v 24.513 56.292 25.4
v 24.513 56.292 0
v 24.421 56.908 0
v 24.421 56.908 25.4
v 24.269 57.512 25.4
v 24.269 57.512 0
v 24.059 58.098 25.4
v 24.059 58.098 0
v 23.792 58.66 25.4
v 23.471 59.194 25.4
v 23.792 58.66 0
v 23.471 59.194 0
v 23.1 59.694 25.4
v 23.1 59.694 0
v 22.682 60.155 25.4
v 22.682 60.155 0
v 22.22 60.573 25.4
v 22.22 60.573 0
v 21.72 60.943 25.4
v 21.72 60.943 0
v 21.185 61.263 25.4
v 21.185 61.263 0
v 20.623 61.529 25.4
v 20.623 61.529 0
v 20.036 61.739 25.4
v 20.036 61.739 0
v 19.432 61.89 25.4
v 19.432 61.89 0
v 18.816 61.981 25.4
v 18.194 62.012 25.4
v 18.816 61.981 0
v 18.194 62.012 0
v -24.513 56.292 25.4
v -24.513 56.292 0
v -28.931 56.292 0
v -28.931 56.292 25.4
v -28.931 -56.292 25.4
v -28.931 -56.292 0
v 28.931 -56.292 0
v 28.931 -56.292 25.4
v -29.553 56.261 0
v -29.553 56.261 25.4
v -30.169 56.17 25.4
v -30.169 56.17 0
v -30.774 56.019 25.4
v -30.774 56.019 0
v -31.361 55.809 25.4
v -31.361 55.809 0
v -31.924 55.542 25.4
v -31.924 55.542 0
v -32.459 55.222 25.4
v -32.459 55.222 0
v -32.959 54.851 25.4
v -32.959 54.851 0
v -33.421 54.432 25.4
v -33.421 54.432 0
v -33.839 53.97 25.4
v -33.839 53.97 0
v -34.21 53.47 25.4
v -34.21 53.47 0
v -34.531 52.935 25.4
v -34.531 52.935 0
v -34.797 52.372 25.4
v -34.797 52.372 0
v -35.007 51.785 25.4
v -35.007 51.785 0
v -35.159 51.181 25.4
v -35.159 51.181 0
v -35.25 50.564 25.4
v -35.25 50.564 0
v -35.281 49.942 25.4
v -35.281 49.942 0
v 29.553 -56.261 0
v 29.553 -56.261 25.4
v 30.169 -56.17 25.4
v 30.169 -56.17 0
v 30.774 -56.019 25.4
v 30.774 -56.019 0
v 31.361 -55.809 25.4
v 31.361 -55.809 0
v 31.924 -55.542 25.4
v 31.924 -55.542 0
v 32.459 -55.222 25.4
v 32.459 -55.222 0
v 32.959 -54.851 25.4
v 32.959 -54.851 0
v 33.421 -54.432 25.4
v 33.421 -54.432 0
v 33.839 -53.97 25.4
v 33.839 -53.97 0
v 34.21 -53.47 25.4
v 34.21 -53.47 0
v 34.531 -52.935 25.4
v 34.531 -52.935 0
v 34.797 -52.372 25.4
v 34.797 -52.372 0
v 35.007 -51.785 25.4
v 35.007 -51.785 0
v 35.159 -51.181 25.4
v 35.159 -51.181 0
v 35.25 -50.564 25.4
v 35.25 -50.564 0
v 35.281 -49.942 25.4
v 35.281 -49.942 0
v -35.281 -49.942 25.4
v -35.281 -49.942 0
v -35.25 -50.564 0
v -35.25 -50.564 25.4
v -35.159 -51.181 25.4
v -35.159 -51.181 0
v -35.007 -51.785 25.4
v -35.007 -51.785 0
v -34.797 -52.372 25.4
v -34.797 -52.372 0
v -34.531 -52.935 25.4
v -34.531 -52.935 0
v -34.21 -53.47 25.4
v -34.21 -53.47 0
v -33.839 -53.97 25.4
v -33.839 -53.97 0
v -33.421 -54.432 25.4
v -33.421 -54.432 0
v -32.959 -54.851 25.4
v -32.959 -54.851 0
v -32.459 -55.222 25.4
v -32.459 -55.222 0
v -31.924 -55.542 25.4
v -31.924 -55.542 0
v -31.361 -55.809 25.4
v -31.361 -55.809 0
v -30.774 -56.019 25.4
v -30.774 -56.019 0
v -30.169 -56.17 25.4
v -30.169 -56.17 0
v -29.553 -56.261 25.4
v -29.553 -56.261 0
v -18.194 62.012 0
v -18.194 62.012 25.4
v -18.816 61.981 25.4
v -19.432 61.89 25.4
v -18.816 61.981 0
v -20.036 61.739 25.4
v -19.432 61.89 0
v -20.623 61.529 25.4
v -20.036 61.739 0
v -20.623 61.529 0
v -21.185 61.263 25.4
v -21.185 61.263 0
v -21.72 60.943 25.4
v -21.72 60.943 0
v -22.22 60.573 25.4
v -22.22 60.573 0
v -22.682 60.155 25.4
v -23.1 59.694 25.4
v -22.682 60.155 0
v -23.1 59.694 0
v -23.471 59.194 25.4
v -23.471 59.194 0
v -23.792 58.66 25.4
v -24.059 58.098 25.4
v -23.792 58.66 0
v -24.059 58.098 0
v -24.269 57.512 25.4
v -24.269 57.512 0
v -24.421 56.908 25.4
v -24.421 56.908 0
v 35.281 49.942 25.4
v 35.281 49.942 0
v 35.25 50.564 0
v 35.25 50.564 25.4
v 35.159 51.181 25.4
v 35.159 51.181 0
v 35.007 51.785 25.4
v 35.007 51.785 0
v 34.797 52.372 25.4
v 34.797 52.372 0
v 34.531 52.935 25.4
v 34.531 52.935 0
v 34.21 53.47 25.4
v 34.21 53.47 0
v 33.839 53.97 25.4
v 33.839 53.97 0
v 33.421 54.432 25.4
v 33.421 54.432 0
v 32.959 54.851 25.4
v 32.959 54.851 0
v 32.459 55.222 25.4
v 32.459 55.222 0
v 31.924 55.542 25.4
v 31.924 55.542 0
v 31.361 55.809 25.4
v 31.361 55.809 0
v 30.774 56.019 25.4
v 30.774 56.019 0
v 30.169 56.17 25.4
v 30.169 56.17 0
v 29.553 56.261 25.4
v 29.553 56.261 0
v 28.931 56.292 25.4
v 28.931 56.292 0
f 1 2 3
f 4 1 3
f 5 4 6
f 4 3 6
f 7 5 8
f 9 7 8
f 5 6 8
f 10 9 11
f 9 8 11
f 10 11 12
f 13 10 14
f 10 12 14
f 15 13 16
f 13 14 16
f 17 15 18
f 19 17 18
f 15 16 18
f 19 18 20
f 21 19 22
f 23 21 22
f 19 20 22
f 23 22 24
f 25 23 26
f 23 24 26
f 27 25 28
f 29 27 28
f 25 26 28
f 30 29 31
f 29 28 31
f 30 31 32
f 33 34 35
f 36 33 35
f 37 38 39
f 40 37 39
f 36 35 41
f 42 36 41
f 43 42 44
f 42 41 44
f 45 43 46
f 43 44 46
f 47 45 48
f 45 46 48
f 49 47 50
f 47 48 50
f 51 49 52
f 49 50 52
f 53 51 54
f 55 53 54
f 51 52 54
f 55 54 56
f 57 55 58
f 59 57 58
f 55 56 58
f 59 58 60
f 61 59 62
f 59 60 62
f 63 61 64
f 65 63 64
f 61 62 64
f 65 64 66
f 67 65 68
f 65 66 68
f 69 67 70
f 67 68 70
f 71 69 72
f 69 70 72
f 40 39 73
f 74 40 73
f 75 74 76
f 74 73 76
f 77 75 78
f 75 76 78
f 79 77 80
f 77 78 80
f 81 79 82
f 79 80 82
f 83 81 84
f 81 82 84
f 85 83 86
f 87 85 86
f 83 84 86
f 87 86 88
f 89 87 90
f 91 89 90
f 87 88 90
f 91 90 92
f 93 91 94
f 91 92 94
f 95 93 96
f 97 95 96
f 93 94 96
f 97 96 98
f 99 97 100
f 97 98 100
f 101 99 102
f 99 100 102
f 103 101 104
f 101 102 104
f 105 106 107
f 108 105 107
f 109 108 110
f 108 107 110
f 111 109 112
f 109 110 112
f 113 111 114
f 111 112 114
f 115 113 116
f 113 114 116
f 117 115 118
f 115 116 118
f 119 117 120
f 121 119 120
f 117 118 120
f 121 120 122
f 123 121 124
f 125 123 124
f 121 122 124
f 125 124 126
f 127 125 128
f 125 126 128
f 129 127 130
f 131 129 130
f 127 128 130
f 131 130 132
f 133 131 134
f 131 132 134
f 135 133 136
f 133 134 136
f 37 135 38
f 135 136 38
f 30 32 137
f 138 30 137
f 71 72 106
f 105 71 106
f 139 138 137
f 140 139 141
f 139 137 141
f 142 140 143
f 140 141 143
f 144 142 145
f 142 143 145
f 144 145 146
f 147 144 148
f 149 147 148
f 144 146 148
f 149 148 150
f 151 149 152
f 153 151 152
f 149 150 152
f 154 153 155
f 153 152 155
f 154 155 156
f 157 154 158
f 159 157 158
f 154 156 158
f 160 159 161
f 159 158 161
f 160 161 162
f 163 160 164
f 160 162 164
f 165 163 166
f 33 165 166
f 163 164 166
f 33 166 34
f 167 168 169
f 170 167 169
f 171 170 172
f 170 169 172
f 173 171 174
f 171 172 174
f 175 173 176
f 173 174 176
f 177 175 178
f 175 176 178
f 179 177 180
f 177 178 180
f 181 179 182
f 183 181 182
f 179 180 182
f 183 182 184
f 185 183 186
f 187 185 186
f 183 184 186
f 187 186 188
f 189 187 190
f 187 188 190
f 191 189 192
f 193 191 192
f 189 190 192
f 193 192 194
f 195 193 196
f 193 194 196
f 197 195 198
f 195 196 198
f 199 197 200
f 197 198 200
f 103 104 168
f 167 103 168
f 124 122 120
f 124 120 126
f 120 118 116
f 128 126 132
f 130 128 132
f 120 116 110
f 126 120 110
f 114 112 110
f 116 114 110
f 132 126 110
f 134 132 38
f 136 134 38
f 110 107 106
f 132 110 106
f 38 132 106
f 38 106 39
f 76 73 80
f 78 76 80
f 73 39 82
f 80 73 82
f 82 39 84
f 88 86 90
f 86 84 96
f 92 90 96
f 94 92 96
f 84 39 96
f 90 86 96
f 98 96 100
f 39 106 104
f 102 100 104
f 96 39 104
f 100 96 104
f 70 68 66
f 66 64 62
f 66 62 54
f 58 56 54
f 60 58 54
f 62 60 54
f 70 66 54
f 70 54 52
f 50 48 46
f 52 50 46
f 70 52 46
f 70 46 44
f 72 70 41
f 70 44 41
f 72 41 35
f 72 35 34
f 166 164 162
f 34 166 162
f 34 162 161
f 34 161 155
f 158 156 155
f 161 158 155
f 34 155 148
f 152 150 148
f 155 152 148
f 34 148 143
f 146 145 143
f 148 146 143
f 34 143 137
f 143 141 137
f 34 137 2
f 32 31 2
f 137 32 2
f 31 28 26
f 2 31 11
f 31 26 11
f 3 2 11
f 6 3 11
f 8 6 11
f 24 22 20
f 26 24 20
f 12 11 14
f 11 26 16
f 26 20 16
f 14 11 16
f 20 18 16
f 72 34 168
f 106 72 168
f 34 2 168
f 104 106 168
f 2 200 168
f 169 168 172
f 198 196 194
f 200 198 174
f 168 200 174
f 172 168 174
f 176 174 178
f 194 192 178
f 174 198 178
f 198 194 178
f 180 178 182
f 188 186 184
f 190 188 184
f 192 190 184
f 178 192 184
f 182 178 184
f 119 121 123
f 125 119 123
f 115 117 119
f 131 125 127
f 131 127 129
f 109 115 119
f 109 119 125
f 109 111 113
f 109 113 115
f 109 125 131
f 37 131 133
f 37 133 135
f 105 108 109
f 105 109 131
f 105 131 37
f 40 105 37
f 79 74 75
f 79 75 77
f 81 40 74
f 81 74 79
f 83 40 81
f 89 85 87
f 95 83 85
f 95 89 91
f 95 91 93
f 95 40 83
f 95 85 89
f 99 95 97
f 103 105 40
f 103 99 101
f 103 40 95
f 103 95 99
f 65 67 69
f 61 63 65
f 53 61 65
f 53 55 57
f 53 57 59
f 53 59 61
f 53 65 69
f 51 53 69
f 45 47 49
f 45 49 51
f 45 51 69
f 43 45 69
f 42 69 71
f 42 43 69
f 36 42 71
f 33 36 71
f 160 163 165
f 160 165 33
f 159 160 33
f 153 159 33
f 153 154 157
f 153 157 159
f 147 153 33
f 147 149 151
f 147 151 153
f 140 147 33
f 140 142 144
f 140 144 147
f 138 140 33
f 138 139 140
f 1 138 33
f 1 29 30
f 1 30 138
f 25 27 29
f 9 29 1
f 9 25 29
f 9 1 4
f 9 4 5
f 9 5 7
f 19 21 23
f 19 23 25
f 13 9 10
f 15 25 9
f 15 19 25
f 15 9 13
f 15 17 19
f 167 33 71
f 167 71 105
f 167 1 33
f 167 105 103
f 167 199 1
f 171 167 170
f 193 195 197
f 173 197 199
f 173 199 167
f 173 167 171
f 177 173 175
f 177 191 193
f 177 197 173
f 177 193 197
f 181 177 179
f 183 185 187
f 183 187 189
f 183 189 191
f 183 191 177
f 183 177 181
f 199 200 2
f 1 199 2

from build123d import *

# Parameters (mm, degrees)
F1_DEPTH = 25.4


with BuildPart() as f1:
    # F0 (on Top) → F1 (new body)
    with BuildSketch(Plane.XY):
        with BuildLine():
            ThreePointArc((24.54447, 55.661607), (24.536622, 55.977219), (24.513096, 56.292051))
            Line((24.513096, 56.292051), (-24.513096, 56.292051))
            ThreePointArc((-24.513096, 56.292051), (-24.536622, 55.977219), (-24.54447, 55.661607))
            Line((-24.54447, 55.661607), (-24.54447, 50.572495))
            Line((-24.54447, 50.572495), (24.54447, 50.572495))
            Line((24.54447, 50.572495), (24.54447, 55.661607))
        make_face()
        with BuildLine():
            ThreePointArc((35.280632, 49.942051), (33.42076, 54.432179), (28.930632, 56.292051))
            Line((28.930632, 56.292051), (24.513096, 56.292051))
            ThreePointArc((24.513096, 56.292051), (24.536622, 55.977219), (24.54447, 55.661607))
            Line((24.54447, 55.661607), (24.54447, 50.572495))
            Line((24.54447, 50.572495), (-24.54447, 50.572495))
            Line((-24.54447, 50.572495), (-24.54447, 55.661607))
            ThreePointArc((-24.54447, 55.661607), (-24.536622, 55.977219), (-24.513096, 56.292051))
            Line((-24.513096, 56.292051), (-28.930632, 56.292051))
            ThreePointArc((-28.930632, 56.292051), (-33.42076, 54.432179), (-35.280632, 49.942051))
            Line((-35.280632, 49.942051), (-35.280632, -49.942051))
            ThreePointArc((-35.280632, -49.942051), (-33.42076, -54.432179), (-28.930632, -56.292051))
            Line((-28.930632, -56.292051), (28.930632, -56.292051))
            ThreePointArc((28.930632, -56.292051), (33.42076, -54.432179), (35.280632, -49.942051))
            Line((35.280632, -49.942051), (35.280632, 49.942051))
        make_face()
        with BuildLine():
            Line((-24.513096, 56.292051), (24.513096, 56.292051))
            ThreePointArc((24.513096, 56.292051), (22.455877, 60.369357), (18.19447, 62.011607))
            Line((18.19447, 62.011607), (-18.19447, 62.011607))
            ThreePointArc((-18.19447, 62.011607), (-22.455877, 60.369357), (-24.513096, 56.292051))
        make_face()
    extrude(amount=F1_DEPTH)


solid = f1.part
